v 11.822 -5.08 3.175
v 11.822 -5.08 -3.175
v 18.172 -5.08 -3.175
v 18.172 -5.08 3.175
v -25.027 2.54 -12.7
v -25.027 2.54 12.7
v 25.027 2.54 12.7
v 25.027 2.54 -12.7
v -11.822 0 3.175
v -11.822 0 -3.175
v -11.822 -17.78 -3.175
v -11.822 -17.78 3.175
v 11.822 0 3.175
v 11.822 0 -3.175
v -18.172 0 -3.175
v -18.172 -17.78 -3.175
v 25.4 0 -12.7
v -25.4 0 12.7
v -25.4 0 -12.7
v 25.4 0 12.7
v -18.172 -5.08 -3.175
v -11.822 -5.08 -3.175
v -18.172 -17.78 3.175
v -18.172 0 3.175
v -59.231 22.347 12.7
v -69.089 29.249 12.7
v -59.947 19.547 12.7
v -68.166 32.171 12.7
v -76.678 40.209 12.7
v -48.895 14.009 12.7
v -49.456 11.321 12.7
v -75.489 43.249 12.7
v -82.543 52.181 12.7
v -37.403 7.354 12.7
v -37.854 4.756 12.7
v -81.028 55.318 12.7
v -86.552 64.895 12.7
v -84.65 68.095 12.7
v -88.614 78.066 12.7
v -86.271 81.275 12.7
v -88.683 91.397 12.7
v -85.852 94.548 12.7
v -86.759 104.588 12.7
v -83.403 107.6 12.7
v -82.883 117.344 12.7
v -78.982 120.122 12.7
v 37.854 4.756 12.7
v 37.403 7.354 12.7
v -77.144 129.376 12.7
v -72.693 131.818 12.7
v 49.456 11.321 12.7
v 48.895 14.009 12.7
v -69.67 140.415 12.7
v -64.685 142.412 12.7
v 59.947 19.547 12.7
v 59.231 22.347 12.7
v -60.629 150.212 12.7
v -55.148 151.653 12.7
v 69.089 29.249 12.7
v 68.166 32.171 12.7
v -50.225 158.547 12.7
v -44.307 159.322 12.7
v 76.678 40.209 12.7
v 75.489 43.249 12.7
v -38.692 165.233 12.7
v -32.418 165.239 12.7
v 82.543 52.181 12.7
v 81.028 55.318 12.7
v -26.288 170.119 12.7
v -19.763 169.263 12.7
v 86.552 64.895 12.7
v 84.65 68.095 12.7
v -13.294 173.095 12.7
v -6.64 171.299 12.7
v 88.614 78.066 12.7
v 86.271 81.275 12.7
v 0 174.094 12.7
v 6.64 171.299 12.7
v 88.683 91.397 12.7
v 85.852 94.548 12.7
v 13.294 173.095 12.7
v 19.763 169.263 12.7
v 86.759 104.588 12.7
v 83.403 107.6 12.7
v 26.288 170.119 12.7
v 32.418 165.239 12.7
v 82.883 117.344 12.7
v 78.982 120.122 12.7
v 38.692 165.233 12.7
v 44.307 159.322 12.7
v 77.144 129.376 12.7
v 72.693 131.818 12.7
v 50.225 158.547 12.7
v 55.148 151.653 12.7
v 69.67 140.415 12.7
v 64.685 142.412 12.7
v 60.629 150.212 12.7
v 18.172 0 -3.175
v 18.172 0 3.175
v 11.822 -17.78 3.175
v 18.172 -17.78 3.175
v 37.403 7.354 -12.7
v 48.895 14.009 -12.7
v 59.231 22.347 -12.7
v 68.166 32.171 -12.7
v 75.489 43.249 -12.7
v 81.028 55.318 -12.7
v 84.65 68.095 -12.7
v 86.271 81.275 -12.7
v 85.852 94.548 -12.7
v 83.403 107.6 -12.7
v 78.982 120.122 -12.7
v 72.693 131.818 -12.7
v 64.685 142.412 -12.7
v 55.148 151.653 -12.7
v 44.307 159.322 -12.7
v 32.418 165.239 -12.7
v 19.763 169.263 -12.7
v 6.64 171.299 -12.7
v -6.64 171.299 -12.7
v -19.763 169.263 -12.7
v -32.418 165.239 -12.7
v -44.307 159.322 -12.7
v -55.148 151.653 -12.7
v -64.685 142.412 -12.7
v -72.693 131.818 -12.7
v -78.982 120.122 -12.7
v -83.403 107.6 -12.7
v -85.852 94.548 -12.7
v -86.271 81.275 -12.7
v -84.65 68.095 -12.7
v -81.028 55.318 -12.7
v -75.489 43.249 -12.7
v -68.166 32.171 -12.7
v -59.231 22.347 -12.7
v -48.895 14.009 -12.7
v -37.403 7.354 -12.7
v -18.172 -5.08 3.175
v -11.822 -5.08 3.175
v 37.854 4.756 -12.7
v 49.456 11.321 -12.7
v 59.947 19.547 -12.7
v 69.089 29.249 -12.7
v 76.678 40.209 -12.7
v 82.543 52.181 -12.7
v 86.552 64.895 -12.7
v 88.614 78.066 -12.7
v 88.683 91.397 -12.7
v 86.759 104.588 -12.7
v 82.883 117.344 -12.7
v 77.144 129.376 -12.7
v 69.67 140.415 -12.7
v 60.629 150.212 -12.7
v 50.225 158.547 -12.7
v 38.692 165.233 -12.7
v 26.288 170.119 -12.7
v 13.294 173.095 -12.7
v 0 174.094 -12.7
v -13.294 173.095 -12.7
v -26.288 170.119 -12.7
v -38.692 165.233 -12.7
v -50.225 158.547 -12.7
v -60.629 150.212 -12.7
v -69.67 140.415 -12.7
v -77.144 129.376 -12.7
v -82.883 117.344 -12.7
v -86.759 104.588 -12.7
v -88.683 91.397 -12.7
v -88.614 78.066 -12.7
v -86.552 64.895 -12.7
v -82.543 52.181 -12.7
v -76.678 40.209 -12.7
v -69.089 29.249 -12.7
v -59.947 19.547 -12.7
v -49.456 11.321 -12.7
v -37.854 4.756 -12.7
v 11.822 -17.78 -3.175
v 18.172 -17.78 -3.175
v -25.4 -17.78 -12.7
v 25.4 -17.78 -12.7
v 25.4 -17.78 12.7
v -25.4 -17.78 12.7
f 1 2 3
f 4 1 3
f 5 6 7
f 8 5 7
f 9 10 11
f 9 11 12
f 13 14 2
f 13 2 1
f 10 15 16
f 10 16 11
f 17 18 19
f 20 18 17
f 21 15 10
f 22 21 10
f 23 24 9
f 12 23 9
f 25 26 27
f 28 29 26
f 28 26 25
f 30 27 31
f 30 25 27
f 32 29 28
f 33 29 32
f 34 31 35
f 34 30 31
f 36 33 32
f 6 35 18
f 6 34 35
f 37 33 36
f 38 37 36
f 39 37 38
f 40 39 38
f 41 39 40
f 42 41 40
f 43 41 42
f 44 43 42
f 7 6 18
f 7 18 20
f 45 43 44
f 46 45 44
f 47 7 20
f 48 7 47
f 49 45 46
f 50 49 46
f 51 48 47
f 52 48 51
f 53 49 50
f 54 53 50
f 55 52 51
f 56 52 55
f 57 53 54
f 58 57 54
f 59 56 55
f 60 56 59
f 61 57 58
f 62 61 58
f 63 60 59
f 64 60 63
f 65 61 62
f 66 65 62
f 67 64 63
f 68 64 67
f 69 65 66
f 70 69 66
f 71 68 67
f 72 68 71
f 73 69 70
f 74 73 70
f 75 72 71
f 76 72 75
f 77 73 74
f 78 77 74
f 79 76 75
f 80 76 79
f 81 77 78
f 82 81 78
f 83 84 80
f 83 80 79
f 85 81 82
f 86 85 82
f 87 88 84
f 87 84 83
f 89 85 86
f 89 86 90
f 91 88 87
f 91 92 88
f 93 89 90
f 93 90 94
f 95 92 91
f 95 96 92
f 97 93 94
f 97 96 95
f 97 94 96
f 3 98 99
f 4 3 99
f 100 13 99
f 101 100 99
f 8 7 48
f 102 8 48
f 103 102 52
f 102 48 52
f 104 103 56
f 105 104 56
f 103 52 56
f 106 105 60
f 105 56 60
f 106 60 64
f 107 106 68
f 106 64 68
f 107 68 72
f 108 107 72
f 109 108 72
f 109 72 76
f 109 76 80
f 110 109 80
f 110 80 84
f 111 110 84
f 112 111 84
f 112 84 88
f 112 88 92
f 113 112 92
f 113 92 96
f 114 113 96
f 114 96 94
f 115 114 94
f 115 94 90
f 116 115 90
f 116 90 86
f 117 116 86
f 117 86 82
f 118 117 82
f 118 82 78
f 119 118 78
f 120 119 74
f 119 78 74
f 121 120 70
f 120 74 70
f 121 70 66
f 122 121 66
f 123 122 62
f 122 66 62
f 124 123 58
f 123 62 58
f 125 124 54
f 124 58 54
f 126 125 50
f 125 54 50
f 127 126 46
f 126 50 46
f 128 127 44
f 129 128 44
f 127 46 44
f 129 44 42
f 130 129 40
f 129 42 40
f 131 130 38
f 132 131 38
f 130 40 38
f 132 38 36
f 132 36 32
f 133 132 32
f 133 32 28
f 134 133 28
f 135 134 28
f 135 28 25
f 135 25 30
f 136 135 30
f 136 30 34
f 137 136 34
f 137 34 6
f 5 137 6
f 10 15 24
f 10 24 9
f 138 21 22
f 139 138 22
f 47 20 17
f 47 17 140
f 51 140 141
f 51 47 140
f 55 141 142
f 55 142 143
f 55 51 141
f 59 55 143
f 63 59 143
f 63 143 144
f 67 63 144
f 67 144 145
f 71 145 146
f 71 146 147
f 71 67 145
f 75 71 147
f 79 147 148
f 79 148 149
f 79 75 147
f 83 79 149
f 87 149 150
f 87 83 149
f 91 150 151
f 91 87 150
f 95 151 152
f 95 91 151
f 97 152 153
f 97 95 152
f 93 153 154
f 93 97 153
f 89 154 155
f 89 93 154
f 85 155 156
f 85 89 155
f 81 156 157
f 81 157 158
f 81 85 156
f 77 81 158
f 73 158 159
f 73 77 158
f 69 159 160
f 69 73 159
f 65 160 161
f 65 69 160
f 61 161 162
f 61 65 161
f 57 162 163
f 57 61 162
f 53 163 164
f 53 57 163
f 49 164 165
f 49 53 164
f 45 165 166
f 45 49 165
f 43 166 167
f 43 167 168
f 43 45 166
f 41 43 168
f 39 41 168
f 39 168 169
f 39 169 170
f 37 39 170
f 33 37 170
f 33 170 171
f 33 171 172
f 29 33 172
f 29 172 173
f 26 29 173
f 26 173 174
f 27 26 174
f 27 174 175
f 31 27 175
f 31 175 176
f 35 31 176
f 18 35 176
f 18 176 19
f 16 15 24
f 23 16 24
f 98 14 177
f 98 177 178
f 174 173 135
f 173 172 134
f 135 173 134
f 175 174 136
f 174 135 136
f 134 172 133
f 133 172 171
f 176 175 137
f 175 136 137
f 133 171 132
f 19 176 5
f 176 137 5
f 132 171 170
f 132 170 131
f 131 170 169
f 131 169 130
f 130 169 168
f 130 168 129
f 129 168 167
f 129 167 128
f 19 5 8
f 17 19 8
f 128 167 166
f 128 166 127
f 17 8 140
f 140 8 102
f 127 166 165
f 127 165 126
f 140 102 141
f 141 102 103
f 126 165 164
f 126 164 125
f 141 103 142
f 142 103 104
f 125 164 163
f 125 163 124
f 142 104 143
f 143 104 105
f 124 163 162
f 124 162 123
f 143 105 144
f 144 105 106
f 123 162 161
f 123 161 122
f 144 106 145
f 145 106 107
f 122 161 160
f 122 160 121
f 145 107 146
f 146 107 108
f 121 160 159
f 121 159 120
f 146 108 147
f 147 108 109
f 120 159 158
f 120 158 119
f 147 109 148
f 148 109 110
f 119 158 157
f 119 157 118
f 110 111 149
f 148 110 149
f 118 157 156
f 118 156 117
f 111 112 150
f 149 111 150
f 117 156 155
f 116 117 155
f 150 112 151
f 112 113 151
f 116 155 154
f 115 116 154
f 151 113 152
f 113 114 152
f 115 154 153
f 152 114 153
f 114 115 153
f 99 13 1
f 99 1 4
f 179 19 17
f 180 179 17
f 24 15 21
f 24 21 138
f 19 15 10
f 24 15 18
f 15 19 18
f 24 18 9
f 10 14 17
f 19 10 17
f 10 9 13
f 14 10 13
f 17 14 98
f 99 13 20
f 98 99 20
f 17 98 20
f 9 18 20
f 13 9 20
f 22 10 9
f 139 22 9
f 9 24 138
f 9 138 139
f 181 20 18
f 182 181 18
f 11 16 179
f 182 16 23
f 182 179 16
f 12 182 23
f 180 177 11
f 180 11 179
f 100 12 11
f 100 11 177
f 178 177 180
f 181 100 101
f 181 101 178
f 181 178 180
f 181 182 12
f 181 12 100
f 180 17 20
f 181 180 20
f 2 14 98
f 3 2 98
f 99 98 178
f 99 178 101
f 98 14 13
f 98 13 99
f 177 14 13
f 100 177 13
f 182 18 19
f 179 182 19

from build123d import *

# Parameters (mm, degrees)
F0_W     = 6.35
F0_H     = 6.35
F1_DEPTH = 5.08
F2_DEPTH = 17.78
F6_DEPTH = 25.4
F7_T     = -2.54


with BuildPart() as f1:
    # F0 (on Front) → F1 (new body)
    with BuildSketch(Plane.XZ):
        with Locations((-14.996996963, 0)):
            Rectangle(F0_W, F0_H)
    extrude(amount=F1_DEPTH)


with BuildPart() as f1b:
    # F0 (on Front) → F1, piece 2 (new body)
    with BuildSketch(Plane.XZ):
        with Locations((14.996996963, 0)):
            Rectangle(F0_W, F0_H)
    extrude(amount=F1_DEPTH)


with BuildPart() as f2:
    # F0 (on Front) → F2 (new body)
    with BuildSketch(Plane.XZ):
        Polygon((-25.4, 12.7), (-25.4, -10.2536968559), (-25.4, -12.7), (25.4, -12.7), (25.4, 12.7), align=None)
        with Locations((-14.996996963, 0)):
            Rectangle(F0_W, F0_H, mode=Mode.SUBTRACT)
        with Locations((14.996996963, 0)):
            Rectangle(F0_W, F0_H, mode=Mode.SUBTRACT)
    extrude(amount=F2_DEPTH)


with BuildPart() as f6:
    # F5 (on offset) → F6 (new body)
    with BuildSketch(Plane.XY.offset(12.7)):
        with BuildLine():
            ThreePointArc((25.4, 0), (0, 174.0941899427), (-25.4, 0))
            Line((-25.4, 0), (25.4, 0))
        make_face()
    extrude(amount=-F6_DEPTH)

    # F7
    f7_openings = [f6.faces().sort_by_distance(p)[0] for p in [
        (0, 85.636439, 12.7),
        (0, 85.636439, -12.7),
    ]]
    offset(amount=F7_T, openings=f7_openings)


solid = Compound([f1.part, f1b.part, f2.part, f6.part])
